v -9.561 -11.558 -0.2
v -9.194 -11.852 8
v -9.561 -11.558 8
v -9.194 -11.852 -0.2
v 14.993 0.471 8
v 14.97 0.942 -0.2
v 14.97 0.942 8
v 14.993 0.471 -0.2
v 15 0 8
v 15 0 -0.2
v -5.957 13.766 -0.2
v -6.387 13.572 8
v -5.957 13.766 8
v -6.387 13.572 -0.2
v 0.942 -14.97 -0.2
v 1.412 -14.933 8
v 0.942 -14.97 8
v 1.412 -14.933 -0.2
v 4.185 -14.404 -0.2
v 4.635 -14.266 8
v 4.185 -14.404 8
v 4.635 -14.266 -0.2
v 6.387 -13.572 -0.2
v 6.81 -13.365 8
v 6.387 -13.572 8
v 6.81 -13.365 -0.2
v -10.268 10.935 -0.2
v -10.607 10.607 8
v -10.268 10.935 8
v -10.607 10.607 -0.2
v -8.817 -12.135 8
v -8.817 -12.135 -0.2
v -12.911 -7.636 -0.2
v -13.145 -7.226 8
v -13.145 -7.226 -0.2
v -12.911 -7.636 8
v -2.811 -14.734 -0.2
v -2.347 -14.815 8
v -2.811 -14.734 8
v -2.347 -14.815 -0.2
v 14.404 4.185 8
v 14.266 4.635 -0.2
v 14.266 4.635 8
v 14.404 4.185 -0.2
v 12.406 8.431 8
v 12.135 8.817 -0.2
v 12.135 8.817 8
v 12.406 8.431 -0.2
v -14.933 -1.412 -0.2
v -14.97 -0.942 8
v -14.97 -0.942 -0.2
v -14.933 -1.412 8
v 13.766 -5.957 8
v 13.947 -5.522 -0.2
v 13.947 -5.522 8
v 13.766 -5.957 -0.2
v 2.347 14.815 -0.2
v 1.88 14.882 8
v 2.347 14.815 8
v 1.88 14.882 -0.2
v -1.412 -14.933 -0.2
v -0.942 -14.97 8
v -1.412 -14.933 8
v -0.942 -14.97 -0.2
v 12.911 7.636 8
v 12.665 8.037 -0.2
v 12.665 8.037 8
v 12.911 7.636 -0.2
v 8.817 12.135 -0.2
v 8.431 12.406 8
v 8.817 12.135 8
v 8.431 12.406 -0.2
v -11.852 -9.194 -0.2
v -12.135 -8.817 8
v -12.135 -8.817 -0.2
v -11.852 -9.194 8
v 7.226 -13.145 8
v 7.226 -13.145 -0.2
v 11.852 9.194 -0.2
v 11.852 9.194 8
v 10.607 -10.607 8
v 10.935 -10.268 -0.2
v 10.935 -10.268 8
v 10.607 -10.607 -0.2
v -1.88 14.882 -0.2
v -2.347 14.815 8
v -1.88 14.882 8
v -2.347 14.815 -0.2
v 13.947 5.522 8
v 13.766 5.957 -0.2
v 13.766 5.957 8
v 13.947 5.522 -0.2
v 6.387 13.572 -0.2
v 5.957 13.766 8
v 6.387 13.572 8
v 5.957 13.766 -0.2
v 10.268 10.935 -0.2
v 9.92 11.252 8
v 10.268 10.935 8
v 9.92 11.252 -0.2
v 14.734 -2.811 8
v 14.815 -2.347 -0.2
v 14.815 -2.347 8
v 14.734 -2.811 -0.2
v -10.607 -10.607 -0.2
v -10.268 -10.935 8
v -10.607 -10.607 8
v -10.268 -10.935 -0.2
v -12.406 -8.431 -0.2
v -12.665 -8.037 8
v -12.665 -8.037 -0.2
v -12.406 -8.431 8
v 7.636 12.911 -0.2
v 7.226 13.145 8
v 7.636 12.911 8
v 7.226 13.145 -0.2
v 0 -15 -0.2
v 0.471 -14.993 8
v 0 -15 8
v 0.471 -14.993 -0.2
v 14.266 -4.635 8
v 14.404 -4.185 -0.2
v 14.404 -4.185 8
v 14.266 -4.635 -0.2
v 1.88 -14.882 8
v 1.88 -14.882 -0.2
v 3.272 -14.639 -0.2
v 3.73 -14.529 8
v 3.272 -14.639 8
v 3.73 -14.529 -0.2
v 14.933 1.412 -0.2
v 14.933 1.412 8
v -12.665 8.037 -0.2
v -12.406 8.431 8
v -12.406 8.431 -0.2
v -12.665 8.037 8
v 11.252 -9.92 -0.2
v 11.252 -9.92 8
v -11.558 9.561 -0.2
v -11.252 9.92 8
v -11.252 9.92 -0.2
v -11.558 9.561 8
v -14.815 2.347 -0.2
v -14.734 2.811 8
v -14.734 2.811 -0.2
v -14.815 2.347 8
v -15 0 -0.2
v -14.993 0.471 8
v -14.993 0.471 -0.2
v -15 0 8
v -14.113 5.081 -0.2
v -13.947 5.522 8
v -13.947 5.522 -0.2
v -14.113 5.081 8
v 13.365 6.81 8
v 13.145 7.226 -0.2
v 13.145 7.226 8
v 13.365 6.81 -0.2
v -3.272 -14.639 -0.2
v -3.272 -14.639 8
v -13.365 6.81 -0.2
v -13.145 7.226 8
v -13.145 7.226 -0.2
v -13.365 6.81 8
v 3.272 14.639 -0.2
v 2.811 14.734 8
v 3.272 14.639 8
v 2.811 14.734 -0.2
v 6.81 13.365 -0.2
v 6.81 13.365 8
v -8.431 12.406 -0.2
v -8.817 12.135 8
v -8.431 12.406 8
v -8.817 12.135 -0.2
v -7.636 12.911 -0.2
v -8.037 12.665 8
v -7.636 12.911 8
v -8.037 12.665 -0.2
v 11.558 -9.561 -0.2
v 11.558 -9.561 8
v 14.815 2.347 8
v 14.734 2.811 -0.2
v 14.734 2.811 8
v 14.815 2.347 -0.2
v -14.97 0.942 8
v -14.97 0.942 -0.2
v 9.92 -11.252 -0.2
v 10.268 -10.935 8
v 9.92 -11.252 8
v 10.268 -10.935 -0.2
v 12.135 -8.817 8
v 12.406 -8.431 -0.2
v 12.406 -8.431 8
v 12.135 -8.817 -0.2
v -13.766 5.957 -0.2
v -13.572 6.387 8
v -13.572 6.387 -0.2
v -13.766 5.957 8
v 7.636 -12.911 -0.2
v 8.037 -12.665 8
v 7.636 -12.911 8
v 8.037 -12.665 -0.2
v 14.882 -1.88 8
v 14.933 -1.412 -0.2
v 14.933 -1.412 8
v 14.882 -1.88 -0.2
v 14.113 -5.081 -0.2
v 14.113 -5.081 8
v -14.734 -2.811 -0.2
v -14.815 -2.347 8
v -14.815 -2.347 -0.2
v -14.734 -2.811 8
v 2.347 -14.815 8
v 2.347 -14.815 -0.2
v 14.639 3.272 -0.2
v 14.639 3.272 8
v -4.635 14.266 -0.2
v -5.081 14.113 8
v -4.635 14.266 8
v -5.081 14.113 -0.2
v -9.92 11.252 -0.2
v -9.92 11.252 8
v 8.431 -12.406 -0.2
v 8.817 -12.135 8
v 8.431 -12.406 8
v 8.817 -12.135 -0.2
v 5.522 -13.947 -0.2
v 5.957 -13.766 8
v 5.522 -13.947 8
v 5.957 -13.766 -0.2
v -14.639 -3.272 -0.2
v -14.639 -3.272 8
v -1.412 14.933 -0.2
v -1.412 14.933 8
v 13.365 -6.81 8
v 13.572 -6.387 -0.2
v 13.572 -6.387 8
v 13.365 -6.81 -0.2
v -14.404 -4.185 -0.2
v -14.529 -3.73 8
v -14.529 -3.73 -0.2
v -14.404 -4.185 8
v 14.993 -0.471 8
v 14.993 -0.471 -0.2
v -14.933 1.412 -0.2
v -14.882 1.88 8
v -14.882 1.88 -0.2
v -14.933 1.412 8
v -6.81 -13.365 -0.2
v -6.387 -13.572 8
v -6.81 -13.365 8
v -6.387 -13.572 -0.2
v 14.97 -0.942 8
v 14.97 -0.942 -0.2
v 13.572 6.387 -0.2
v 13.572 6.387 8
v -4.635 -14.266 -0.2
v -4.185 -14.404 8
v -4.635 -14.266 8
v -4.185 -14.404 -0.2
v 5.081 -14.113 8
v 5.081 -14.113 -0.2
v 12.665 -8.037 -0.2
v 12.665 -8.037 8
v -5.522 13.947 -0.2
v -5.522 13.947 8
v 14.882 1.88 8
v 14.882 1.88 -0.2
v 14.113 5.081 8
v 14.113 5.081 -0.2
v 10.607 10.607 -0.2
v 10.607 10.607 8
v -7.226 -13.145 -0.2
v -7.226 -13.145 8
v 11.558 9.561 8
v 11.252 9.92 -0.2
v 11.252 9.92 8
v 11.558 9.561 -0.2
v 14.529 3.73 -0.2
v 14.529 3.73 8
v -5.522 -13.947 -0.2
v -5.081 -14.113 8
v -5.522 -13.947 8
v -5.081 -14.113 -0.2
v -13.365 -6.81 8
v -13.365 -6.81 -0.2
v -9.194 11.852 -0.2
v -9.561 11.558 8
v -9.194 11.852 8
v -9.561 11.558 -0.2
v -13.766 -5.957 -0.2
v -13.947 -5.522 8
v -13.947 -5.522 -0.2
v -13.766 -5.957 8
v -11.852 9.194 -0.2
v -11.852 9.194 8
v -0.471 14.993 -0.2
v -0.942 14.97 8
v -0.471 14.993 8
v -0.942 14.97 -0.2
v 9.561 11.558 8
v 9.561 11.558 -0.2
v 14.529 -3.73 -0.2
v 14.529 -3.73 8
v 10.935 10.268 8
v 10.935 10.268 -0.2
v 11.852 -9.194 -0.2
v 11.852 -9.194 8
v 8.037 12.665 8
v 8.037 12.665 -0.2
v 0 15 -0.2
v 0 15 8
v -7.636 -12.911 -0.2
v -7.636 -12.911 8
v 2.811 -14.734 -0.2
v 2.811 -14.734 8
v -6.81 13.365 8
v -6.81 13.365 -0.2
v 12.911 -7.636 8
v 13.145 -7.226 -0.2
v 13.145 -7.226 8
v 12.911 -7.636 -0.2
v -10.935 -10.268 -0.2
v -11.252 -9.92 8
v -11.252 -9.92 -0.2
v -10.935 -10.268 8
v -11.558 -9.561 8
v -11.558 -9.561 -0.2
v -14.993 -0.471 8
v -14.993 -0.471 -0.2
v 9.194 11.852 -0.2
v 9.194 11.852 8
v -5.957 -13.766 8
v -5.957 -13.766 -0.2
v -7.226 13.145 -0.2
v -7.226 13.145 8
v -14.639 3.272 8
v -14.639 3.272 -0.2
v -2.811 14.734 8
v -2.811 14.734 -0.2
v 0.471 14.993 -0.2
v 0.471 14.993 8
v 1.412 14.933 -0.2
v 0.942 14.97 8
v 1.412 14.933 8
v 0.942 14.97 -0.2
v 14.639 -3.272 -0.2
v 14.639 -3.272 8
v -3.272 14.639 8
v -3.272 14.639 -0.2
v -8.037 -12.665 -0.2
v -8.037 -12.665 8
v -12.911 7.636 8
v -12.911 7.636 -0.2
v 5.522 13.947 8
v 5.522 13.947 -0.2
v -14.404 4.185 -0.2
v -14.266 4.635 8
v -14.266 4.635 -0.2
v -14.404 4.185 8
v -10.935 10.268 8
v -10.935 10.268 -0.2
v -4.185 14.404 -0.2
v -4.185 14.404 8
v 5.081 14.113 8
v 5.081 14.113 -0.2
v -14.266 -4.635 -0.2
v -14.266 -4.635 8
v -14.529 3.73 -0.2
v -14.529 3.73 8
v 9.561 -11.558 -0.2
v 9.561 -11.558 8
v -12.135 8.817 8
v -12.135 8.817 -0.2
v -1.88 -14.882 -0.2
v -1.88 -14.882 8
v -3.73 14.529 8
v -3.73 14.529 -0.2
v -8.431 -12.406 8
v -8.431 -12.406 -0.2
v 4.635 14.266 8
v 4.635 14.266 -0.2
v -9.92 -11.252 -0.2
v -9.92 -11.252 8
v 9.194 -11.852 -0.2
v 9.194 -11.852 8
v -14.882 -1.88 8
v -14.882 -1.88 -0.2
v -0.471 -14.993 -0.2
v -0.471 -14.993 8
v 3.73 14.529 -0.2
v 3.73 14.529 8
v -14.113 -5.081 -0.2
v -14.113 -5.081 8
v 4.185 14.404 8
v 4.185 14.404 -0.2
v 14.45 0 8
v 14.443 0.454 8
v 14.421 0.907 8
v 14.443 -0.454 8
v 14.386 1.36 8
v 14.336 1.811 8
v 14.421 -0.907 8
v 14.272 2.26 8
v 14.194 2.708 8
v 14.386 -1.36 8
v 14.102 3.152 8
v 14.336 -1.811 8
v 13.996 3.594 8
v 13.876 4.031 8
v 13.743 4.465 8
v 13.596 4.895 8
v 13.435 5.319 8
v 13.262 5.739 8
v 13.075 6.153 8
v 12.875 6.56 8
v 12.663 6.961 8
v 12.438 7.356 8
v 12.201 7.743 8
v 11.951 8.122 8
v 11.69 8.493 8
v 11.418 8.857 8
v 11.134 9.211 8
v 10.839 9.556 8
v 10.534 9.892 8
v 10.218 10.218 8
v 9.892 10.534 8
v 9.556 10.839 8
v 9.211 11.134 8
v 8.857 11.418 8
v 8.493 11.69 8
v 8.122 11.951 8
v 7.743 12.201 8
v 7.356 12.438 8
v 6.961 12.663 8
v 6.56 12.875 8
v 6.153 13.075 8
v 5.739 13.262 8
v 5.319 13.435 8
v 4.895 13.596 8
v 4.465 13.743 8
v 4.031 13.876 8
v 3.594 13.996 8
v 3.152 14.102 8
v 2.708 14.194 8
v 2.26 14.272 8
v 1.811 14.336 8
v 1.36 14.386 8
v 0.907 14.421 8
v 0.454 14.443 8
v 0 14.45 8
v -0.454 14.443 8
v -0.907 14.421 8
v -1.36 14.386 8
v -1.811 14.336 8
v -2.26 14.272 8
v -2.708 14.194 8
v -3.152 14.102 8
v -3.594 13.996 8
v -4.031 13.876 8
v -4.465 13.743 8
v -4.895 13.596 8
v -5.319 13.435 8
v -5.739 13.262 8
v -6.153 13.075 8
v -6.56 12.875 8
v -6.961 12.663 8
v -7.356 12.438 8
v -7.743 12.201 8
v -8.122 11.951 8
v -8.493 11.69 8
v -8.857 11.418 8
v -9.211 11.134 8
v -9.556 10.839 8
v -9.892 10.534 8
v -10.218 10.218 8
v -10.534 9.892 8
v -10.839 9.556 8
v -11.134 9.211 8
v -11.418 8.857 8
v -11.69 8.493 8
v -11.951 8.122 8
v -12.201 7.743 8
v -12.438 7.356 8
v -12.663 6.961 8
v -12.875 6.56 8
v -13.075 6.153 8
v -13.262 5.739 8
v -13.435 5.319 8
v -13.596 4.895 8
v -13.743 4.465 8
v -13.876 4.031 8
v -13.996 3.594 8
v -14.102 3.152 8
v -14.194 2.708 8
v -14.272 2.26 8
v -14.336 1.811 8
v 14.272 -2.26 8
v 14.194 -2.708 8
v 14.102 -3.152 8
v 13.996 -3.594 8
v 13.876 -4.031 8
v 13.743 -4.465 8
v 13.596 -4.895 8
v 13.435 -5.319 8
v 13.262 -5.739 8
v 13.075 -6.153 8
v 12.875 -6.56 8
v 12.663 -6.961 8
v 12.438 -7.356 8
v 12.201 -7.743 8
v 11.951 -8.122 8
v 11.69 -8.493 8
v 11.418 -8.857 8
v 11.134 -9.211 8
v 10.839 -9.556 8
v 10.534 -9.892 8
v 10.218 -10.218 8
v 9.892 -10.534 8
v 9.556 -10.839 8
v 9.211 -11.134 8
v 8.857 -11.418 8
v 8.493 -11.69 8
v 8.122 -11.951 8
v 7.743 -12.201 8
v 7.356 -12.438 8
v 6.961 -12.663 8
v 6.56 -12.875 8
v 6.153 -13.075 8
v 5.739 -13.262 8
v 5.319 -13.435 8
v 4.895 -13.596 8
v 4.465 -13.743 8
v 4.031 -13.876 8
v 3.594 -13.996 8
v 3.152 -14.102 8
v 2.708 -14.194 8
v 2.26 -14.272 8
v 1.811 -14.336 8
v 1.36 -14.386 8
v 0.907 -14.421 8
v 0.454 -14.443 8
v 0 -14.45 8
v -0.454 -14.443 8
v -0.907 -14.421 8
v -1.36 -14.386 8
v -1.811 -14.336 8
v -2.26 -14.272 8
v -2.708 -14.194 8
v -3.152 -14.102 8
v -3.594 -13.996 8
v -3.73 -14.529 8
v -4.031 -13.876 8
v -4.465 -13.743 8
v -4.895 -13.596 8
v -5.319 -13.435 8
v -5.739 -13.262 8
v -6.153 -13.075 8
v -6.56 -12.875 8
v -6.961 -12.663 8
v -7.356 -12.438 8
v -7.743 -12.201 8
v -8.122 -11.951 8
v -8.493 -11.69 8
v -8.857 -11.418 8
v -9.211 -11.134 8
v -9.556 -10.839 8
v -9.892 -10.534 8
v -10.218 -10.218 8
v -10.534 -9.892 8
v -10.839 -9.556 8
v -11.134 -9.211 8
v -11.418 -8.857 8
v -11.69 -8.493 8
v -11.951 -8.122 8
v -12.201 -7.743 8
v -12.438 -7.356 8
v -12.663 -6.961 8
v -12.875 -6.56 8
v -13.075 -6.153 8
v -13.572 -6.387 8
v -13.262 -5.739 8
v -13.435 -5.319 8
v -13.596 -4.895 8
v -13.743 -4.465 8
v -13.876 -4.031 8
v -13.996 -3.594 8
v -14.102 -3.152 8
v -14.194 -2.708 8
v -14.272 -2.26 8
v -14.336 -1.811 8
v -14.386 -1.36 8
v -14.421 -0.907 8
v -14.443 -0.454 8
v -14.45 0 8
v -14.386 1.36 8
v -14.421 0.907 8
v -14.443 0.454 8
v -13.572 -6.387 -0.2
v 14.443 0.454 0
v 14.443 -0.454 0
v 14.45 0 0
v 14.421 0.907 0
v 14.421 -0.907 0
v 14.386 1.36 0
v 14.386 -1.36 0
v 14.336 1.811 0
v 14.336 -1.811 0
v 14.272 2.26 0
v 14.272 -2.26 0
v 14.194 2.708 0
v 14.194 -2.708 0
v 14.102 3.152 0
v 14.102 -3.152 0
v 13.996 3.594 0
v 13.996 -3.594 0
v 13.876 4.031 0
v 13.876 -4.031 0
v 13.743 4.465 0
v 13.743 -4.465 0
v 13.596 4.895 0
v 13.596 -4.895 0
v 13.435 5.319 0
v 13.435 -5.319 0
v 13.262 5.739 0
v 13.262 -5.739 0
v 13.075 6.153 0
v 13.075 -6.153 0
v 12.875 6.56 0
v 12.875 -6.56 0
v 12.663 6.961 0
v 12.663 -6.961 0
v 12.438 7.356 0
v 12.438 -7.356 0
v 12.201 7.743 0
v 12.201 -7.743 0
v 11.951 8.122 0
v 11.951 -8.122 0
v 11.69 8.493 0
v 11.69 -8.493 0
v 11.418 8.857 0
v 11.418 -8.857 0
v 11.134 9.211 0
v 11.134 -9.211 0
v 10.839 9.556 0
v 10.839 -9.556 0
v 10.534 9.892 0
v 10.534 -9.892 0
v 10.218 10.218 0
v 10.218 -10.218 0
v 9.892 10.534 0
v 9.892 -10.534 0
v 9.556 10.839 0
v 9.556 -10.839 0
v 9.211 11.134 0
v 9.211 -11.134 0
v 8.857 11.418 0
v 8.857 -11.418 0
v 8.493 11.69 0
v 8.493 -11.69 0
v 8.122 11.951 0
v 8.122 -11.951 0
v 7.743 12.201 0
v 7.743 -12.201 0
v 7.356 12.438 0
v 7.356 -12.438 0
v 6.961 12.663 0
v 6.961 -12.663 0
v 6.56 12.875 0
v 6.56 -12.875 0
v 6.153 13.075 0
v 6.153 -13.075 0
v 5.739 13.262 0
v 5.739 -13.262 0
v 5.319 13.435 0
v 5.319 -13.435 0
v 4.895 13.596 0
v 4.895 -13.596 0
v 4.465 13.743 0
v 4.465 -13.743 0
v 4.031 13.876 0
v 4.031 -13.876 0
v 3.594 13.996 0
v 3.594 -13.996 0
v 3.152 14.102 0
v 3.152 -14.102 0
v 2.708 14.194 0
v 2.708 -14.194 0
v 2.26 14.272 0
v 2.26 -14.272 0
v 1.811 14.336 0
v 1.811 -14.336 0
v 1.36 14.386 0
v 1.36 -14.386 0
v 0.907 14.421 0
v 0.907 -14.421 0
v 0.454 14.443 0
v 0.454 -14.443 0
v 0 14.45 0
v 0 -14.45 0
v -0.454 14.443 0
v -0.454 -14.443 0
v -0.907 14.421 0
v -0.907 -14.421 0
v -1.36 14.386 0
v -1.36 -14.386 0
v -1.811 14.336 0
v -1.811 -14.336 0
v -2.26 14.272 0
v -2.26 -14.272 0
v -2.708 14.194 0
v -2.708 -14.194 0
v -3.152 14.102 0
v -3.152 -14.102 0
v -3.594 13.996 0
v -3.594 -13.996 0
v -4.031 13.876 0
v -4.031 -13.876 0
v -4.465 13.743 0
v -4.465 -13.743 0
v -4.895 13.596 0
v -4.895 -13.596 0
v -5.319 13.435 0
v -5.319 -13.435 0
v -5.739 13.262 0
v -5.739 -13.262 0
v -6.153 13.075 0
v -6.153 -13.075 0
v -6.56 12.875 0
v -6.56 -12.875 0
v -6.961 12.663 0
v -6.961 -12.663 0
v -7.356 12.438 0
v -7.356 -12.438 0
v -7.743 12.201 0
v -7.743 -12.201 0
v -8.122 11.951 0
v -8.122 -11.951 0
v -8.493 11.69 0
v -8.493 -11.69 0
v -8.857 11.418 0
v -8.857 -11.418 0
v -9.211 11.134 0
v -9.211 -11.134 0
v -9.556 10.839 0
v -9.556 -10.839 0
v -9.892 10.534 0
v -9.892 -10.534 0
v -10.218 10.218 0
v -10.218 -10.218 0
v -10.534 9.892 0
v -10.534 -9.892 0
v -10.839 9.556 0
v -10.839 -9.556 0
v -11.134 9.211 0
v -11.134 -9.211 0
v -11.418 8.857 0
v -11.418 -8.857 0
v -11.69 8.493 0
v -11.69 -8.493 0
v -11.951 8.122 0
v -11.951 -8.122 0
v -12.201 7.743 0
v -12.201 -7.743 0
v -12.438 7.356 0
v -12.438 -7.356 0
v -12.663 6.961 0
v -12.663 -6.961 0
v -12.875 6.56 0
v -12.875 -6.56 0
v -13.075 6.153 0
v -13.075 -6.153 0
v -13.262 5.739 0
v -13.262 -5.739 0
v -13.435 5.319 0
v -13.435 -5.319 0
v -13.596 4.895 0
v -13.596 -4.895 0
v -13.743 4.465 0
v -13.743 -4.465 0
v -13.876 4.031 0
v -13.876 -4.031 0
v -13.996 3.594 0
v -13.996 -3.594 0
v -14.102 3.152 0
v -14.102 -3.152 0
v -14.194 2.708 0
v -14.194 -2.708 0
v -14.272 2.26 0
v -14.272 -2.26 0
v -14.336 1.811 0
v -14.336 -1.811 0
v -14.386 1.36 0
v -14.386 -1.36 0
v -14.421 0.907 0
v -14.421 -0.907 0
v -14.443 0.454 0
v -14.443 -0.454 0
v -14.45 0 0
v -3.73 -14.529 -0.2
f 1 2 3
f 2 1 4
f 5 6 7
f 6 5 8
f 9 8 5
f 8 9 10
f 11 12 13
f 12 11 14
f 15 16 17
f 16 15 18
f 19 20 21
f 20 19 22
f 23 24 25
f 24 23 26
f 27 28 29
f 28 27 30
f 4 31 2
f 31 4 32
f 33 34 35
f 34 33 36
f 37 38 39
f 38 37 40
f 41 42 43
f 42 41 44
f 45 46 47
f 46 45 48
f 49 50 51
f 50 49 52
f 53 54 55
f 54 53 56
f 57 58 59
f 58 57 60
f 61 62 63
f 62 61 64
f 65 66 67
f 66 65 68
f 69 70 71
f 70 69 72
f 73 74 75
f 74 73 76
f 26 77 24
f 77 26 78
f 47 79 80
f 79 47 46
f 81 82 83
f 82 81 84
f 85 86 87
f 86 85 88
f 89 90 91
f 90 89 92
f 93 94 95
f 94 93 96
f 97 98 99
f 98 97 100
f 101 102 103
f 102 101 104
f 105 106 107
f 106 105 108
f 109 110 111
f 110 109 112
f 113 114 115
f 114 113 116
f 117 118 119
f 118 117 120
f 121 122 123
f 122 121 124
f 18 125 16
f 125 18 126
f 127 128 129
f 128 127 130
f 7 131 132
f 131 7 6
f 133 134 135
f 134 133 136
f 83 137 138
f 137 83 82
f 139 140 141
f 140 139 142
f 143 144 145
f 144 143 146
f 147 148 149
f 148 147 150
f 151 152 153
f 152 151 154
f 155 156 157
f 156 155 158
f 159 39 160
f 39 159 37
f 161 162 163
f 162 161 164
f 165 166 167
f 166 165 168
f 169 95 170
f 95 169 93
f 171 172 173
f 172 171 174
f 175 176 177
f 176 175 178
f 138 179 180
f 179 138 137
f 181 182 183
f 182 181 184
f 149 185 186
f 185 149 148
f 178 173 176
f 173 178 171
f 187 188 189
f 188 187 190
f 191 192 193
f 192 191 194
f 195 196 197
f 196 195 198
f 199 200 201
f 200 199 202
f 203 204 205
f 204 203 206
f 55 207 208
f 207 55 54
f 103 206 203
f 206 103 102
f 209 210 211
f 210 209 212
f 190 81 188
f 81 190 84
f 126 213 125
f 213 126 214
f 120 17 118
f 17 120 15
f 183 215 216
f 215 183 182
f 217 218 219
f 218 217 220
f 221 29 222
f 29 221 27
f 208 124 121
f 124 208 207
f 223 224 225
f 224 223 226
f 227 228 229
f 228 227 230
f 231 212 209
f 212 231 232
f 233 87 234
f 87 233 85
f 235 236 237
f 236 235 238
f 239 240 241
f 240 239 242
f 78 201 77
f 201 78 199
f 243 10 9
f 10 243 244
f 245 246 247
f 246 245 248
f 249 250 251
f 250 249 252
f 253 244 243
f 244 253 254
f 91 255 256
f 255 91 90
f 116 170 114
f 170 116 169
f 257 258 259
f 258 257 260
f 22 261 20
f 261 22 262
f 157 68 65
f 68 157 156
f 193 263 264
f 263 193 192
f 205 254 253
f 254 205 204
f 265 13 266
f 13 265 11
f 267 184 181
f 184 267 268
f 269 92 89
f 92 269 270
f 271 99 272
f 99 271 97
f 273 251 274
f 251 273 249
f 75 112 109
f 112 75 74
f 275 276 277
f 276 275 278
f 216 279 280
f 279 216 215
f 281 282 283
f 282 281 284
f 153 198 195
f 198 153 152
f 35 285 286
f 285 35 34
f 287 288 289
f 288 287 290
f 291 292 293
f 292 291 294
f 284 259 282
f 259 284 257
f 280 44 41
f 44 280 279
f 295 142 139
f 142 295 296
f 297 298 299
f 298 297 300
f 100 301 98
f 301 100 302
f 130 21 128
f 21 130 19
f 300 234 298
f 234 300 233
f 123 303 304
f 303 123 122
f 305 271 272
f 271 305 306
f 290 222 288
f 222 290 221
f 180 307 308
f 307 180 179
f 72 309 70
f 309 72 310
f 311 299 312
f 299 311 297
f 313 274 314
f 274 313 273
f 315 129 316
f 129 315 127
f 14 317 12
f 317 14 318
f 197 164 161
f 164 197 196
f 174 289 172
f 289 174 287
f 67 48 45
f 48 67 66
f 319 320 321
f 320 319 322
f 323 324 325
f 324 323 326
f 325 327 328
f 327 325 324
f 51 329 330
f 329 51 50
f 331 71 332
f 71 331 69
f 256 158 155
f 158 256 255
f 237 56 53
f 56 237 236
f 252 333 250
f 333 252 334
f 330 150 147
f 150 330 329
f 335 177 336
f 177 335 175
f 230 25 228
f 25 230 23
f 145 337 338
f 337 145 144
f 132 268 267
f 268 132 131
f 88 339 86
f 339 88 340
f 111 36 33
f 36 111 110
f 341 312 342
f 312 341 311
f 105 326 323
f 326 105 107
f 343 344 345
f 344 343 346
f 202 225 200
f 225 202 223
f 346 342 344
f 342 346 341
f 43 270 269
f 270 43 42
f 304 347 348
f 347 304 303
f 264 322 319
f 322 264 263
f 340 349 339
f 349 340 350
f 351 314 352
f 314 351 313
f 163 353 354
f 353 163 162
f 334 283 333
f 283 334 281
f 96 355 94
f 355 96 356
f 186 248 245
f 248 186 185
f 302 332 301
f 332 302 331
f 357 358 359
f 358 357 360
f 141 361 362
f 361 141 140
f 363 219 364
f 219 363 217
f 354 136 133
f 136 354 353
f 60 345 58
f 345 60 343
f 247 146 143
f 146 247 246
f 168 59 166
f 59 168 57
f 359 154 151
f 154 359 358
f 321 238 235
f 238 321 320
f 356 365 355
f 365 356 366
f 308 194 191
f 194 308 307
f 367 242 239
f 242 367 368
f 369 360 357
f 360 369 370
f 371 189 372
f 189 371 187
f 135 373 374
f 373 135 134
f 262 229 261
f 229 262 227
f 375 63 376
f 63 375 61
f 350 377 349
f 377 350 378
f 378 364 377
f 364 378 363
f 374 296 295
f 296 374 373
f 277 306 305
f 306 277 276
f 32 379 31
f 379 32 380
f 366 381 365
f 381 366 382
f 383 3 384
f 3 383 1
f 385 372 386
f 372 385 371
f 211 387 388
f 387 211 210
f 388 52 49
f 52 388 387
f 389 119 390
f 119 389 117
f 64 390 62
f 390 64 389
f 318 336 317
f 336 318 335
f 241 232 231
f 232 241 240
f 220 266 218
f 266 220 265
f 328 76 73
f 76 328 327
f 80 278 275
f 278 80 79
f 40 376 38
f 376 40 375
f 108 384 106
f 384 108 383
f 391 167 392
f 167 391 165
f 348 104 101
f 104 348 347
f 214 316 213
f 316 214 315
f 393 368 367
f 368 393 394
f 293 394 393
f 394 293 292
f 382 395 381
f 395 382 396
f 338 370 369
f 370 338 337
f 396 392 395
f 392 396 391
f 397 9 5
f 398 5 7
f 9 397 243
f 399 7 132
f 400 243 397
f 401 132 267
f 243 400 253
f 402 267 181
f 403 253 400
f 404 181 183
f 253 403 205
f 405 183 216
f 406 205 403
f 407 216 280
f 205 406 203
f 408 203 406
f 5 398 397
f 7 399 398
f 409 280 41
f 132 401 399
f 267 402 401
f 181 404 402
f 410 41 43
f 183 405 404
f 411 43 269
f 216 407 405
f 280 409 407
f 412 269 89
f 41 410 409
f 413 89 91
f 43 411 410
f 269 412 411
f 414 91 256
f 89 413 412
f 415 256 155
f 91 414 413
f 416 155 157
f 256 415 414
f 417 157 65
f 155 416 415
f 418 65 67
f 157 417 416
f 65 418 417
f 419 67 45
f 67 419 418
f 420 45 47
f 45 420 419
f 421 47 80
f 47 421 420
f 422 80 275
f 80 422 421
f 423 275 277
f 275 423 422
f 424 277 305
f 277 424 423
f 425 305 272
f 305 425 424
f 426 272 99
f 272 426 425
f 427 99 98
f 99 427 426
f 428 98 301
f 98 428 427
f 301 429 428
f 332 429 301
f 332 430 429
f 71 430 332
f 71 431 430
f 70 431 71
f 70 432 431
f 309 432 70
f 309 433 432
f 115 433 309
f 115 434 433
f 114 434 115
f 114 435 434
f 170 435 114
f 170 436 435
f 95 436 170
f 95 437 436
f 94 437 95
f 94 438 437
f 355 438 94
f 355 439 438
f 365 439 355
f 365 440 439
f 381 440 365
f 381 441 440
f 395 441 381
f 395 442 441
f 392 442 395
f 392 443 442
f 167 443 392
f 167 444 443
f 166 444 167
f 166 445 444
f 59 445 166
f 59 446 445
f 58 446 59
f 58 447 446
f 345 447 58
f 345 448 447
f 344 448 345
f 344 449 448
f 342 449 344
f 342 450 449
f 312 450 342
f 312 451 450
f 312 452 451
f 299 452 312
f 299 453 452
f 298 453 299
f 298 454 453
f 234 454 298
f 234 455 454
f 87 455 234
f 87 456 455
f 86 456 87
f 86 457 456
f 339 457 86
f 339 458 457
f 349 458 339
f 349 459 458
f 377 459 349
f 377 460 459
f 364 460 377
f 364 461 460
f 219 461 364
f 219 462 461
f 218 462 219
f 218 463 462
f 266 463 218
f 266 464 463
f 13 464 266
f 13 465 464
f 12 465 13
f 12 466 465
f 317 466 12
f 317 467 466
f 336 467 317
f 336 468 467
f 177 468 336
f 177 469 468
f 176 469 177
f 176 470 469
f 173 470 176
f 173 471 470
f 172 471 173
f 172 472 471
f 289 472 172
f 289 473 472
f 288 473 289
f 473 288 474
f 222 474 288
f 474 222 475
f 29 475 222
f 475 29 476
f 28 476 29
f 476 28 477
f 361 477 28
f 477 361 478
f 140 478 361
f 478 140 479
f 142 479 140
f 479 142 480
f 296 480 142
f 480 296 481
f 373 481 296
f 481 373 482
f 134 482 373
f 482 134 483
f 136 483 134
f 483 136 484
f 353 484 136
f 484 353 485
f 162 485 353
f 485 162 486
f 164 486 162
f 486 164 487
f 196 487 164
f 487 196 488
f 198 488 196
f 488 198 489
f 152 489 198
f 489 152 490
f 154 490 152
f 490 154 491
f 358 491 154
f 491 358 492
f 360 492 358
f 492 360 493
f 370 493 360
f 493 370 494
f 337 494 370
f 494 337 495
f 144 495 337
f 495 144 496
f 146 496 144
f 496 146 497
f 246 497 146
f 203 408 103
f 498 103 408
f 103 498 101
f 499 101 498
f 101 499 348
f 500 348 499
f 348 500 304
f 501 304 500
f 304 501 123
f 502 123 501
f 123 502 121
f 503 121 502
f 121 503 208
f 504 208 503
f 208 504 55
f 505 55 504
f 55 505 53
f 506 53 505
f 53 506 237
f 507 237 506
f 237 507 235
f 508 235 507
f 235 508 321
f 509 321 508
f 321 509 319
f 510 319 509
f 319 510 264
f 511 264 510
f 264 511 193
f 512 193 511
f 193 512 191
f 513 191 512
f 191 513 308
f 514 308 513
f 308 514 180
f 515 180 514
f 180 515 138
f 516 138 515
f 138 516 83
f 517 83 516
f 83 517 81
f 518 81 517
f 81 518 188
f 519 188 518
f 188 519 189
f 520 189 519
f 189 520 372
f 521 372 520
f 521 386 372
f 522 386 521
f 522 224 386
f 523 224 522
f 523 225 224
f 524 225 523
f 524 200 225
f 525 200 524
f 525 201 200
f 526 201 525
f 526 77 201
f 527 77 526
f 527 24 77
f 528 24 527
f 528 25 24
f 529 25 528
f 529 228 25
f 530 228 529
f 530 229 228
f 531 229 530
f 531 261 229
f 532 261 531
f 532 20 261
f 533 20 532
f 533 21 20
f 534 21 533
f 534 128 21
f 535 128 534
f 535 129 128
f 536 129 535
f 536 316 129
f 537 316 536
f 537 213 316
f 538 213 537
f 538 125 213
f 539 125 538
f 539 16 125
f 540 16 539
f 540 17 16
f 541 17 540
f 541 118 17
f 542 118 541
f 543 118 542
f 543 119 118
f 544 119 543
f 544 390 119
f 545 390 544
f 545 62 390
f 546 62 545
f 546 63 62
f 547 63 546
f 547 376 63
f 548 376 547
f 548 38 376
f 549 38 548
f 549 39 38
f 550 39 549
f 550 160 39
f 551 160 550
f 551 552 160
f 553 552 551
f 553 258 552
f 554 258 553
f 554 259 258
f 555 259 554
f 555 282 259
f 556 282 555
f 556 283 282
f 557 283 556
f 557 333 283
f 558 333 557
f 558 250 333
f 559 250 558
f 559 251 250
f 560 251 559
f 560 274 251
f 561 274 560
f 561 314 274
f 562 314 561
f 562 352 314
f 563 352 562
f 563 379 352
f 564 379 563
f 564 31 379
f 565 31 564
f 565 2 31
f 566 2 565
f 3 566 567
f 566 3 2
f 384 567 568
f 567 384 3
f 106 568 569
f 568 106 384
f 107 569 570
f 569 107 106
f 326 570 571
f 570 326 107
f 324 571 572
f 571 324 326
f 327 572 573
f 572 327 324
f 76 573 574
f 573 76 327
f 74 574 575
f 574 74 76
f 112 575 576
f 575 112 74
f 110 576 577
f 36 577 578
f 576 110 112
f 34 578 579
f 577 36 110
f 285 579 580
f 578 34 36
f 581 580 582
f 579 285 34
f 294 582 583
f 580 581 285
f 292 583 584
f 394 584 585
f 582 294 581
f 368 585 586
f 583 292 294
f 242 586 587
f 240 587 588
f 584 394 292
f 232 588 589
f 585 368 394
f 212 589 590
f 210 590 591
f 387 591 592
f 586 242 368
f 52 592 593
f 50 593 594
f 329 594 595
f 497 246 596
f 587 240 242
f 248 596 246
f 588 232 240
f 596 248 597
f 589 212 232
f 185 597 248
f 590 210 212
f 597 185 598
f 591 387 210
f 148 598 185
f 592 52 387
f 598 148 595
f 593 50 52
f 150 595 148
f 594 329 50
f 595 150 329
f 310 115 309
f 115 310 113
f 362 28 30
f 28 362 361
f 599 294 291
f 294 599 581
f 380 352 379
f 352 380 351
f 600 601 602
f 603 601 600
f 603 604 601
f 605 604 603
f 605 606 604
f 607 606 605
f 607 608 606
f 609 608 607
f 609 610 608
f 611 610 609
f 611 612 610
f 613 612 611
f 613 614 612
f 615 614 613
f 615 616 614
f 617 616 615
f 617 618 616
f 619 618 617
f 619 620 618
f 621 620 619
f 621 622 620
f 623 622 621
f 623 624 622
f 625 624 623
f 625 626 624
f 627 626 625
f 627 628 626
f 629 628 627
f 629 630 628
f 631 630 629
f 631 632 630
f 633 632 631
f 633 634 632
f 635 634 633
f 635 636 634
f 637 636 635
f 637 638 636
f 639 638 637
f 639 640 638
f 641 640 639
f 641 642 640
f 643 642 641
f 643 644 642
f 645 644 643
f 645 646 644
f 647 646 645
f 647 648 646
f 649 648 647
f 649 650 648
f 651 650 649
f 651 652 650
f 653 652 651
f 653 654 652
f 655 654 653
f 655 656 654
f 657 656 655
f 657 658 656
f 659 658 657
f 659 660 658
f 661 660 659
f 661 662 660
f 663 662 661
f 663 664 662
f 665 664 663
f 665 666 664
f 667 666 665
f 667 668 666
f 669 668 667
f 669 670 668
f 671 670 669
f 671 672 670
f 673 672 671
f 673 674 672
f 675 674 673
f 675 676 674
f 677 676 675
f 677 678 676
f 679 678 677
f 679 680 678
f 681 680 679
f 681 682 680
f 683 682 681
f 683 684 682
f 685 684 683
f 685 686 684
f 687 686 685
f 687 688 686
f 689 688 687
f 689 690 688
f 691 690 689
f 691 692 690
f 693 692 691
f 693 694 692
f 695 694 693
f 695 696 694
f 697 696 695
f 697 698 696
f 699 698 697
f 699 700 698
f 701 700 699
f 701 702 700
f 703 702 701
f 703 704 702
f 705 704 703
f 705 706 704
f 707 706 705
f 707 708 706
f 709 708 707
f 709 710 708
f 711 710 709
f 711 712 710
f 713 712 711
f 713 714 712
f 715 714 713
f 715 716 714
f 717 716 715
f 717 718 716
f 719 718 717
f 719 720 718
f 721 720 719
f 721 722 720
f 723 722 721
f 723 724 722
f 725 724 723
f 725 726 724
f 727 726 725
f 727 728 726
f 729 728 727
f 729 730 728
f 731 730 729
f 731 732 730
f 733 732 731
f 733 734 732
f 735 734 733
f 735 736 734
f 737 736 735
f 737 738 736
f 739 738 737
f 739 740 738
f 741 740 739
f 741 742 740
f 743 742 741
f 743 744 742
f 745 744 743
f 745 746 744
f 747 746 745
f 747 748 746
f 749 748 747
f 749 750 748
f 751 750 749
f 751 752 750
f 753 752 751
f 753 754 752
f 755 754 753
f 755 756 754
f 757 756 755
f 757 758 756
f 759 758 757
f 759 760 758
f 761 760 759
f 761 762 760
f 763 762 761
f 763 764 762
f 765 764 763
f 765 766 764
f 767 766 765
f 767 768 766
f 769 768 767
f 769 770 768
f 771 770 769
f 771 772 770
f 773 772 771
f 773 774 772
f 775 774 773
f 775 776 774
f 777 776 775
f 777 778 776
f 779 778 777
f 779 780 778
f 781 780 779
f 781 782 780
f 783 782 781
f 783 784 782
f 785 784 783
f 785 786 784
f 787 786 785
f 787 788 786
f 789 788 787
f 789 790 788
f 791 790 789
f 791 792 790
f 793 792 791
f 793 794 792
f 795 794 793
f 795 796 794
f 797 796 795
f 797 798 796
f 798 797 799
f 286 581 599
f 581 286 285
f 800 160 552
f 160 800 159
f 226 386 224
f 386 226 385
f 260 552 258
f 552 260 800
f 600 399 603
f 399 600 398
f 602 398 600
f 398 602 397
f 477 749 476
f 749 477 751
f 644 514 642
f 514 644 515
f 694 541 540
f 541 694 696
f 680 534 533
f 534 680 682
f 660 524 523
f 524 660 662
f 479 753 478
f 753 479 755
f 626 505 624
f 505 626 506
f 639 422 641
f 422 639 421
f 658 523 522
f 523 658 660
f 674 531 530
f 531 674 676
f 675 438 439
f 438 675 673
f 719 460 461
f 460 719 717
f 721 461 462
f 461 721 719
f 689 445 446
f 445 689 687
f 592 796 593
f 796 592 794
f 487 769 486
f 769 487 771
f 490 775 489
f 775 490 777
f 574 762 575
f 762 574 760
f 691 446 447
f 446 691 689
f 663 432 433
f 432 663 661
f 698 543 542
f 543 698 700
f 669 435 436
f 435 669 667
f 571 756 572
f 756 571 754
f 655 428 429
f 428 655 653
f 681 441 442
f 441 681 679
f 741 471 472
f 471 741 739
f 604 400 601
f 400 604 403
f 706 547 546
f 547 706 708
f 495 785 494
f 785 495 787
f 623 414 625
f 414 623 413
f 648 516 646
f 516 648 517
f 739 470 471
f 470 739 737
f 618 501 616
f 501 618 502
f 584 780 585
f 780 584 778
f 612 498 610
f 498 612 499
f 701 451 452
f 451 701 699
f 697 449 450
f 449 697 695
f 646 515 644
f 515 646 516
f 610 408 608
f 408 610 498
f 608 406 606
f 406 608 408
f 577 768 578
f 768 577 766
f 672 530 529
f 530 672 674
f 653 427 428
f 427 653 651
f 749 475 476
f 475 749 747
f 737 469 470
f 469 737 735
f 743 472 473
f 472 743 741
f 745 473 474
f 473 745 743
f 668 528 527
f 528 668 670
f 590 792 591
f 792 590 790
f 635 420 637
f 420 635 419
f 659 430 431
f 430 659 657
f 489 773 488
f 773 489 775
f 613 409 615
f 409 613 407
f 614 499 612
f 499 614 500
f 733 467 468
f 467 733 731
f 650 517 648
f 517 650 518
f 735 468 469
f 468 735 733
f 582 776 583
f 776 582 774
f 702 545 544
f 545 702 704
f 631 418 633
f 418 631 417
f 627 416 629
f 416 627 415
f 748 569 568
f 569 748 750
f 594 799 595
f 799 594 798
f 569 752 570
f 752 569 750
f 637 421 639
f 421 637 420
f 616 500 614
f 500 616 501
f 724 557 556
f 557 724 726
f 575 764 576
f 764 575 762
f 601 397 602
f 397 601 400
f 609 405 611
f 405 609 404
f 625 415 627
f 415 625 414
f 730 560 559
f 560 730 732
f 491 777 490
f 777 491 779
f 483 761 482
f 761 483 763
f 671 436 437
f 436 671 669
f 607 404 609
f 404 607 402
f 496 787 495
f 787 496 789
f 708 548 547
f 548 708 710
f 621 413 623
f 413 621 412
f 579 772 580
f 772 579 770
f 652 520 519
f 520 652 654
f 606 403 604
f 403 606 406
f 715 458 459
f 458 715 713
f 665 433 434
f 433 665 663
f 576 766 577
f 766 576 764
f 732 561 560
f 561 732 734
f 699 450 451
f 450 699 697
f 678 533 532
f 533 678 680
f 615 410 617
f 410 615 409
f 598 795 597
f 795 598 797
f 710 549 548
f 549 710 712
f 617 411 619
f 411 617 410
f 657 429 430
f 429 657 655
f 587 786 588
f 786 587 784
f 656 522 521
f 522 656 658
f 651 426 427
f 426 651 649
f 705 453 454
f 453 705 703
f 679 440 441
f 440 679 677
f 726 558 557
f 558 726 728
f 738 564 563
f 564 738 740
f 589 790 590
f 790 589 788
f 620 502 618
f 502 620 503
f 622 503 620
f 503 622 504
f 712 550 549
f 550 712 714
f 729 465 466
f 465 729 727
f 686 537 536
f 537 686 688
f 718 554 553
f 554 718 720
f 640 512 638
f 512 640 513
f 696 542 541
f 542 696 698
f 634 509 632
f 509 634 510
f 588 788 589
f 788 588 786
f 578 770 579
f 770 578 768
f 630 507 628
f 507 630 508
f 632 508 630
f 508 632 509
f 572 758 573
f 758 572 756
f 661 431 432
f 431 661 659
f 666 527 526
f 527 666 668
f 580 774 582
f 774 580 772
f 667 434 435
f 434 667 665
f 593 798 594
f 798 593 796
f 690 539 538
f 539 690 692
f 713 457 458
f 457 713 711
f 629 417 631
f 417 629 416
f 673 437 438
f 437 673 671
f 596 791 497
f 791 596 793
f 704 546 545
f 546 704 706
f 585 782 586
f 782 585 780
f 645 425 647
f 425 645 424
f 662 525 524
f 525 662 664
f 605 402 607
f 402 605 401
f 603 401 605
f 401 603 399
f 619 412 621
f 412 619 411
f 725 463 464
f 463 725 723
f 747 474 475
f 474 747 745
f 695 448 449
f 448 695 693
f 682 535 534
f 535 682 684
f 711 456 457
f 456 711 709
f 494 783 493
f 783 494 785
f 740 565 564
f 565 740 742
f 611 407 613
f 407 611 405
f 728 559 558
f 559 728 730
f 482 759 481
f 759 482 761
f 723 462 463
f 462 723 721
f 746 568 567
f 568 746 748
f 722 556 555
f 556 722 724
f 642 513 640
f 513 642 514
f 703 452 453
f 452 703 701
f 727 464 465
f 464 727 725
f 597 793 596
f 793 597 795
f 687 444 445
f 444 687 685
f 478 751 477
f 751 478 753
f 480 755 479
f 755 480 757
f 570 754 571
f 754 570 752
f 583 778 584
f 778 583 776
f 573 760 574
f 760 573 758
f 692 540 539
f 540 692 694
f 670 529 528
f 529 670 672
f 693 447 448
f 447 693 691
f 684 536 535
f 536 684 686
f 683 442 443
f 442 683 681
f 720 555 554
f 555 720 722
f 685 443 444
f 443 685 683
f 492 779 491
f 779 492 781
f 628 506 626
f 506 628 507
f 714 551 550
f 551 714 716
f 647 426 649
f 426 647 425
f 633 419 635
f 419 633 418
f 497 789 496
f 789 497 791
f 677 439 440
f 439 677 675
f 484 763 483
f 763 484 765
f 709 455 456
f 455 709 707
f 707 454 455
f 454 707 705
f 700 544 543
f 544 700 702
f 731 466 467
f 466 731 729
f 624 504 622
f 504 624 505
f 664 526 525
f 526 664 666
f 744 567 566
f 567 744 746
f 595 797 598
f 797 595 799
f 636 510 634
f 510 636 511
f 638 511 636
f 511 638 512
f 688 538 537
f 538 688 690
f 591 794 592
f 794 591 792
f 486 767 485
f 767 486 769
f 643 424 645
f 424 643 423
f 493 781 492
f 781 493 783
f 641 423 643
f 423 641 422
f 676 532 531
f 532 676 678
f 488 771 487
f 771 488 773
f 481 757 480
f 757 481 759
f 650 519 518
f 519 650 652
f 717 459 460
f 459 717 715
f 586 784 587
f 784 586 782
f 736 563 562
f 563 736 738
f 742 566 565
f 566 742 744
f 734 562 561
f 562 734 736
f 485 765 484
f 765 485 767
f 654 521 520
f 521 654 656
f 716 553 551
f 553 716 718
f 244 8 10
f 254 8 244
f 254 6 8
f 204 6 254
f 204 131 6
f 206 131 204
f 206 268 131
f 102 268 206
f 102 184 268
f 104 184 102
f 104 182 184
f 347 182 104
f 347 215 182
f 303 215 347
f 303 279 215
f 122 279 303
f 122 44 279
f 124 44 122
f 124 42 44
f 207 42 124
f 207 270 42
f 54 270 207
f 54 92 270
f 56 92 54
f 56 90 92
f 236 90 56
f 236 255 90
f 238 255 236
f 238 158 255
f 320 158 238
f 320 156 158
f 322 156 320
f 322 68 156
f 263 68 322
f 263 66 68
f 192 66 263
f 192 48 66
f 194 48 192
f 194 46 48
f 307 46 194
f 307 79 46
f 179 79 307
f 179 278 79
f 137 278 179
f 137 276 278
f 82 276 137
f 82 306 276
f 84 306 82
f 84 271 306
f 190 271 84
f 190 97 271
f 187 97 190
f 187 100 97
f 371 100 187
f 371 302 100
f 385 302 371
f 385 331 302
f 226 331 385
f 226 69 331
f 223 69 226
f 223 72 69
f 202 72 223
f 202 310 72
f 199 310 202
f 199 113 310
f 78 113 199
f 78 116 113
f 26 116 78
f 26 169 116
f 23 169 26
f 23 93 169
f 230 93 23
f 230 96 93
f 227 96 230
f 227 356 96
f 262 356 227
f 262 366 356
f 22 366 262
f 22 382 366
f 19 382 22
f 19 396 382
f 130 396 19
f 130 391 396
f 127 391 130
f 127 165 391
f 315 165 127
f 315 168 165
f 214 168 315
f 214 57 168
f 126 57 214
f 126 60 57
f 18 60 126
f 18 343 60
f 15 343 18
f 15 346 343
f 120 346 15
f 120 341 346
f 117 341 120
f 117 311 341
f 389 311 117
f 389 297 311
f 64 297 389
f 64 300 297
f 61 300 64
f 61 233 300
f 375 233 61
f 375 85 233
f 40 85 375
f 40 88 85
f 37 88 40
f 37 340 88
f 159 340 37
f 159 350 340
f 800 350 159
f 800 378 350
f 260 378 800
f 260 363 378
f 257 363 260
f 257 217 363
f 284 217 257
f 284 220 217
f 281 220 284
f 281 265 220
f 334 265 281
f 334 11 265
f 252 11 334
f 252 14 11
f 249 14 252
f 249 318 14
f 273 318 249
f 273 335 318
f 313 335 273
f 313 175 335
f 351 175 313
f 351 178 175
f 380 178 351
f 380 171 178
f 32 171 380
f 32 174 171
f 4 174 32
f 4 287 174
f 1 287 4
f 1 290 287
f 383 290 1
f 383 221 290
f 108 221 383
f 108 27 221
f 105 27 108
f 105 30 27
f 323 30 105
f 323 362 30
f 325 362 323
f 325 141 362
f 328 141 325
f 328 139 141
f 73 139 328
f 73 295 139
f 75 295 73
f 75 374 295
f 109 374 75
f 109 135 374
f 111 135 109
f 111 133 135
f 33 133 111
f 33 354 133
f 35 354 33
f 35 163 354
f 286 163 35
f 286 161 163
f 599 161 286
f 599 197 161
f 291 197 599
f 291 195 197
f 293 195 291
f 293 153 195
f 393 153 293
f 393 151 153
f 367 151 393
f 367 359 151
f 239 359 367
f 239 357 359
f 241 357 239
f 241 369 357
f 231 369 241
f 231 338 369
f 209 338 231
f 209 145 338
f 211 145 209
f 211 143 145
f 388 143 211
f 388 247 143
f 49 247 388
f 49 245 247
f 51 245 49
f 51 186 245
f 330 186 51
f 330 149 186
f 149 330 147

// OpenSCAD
//Diameter of cylinder
diameter=30;
//Width of single wall layer
extrusionWidth=0.55;
//Height of cylinder
height=8;
//Height/thickness of bottom (0 for no bottom)
layerHeight=0.2;


/* [hidden] */
rad=diameter/2;
$fn=200;

union() {
translate([0,0,-layerHeight]) cylinder(r=rad, h=layerHeight);
	difference () {
		cylinder(r=rad, h=height);
		translate([0,0,-1])
		cylinder(r=rad-extrusionWidth, h=height+2);
	}
}
